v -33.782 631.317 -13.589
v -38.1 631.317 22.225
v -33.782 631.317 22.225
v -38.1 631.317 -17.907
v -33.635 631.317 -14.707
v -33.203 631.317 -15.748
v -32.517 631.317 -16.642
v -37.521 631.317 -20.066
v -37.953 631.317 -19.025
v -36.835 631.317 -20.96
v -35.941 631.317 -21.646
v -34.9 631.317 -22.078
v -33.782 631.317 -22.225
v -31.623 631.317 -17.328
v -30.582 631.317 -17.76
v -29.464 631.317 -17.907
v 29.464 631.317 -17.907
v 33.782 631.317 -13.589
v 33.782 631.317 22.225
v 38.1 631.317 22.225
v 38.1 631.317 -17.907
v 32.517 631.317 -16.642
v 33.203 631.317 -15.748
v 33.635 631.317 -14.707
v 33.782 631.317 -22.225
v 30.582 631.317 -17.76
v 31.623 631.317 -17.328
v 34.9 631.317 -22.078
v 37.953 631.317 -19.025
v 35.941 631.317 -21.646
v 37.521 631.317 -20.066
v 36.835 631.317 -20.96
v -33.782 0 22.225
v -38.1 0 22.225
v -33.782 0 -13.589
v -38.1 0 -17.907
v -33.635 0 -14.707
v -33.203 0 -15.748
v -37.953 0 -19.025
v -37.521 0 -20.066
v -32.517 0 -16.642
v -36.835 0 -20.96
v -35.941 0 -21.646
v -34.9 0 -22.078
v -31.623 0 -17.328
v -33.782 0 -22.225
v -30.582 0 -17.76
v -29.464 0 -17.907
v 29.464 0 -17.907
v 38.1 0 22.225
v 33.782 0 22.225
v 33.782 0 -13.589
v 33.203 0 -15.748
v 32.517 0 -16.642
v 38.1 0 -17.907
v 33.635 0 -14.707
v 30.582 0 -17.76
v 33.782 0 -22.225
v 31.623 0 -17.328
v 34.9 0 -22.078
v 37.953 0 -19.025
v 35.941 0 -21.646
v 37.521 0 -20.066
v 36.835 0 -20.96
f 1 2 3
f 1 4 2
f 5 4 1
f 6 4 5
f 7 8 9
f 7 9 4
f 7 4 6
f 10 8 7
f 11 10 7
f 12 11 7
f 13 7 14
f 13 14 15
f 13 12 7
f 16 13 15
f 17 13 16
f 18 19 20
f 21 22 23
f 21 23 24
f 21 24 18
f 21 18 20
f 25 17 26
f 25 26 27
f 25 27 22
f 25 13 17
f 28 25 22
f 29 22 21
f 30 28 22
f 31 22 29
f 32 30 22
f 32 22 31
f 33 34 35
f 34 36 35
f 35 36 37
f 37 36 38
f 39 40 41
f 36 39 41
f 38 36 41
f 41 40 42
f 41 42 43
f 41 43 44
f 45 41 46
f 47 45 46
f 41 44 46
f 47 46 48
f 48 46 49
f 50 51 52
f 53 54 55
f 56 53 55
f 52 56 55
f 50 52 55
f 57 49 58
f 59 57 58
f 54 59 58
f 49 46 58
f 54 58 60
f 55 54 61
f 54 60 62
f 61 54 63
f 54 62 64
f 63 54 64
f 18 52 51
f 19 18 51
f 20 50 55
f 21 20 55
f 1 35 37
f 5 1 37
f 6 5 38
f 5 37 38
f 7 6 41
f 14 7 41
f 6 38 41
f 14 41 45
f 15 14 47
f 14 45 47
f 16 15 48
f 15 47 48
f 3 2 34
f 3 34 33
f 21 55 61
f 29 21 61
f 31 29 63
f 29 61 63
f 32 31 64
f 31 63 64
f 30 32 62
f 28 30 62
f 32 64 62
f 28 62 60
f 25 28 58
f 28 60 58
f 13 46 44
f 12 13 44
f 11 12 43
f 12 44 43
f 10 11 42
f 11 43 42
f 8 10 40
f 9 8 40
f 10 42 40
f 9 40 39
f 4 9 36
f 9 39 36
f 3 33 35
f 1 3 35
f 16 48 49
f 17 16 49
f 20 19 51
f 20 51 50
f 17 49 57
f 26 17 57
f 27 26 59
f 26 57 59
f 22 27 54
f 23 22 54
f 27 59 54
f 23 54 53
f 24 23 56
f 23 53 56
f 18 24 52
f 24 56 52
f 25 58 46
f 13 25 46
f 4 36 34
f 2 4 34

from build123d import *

# Parameters (mm, degrees)
BOSS_EXTRUDE1_DEPTH = 631.317


with BuildPart() as part:
    # Sketch1 → Boss-Extrude1 (new body)
    with BuildSketch(Plane(origin=(0, 0, 0), x_dir=(1, 0, 0), z_dir=(0, 1, 0))):
        with BuildLine():
            Line((-38.1, -22.225), (-33.782, -22.225))
            Line((-33.782, -22.225), (-33.782, 13.589))
            ThreePointArc((-33.782, 13.589), (-32.517287081, 16.642287081), (-29.464, 17.907))
            Line((-29.464, 17.907), (29.464, 17.907))
            ThreePointArc((29.464, 17.907), (32.517287081, 16.642287081), (33.782, 13.589))
            Line((33.782, 13.589), (33.782, -22.225))
            Line((33.782, -22.225), (38.1, -22.225))
            Line((38.1, -22.225), (38.1, 17.907))
            ThreePointArc((38.1, 17.907), (36.835287081, 20.960287081), (33.782, 22.225))
            Line((33.782, 22.225), (-33.782, 22.225))
            ThreePointArc((-33.782, 22.225), (-36.835287081, 20.960287081), (-38.1, 17.907))
            Line((-38.1, 17.907), (-38.1, -22.225))
        make_face()
    extrude(amount=BOSS_EXTRUDE1_DEPTH)


solid = part.part
